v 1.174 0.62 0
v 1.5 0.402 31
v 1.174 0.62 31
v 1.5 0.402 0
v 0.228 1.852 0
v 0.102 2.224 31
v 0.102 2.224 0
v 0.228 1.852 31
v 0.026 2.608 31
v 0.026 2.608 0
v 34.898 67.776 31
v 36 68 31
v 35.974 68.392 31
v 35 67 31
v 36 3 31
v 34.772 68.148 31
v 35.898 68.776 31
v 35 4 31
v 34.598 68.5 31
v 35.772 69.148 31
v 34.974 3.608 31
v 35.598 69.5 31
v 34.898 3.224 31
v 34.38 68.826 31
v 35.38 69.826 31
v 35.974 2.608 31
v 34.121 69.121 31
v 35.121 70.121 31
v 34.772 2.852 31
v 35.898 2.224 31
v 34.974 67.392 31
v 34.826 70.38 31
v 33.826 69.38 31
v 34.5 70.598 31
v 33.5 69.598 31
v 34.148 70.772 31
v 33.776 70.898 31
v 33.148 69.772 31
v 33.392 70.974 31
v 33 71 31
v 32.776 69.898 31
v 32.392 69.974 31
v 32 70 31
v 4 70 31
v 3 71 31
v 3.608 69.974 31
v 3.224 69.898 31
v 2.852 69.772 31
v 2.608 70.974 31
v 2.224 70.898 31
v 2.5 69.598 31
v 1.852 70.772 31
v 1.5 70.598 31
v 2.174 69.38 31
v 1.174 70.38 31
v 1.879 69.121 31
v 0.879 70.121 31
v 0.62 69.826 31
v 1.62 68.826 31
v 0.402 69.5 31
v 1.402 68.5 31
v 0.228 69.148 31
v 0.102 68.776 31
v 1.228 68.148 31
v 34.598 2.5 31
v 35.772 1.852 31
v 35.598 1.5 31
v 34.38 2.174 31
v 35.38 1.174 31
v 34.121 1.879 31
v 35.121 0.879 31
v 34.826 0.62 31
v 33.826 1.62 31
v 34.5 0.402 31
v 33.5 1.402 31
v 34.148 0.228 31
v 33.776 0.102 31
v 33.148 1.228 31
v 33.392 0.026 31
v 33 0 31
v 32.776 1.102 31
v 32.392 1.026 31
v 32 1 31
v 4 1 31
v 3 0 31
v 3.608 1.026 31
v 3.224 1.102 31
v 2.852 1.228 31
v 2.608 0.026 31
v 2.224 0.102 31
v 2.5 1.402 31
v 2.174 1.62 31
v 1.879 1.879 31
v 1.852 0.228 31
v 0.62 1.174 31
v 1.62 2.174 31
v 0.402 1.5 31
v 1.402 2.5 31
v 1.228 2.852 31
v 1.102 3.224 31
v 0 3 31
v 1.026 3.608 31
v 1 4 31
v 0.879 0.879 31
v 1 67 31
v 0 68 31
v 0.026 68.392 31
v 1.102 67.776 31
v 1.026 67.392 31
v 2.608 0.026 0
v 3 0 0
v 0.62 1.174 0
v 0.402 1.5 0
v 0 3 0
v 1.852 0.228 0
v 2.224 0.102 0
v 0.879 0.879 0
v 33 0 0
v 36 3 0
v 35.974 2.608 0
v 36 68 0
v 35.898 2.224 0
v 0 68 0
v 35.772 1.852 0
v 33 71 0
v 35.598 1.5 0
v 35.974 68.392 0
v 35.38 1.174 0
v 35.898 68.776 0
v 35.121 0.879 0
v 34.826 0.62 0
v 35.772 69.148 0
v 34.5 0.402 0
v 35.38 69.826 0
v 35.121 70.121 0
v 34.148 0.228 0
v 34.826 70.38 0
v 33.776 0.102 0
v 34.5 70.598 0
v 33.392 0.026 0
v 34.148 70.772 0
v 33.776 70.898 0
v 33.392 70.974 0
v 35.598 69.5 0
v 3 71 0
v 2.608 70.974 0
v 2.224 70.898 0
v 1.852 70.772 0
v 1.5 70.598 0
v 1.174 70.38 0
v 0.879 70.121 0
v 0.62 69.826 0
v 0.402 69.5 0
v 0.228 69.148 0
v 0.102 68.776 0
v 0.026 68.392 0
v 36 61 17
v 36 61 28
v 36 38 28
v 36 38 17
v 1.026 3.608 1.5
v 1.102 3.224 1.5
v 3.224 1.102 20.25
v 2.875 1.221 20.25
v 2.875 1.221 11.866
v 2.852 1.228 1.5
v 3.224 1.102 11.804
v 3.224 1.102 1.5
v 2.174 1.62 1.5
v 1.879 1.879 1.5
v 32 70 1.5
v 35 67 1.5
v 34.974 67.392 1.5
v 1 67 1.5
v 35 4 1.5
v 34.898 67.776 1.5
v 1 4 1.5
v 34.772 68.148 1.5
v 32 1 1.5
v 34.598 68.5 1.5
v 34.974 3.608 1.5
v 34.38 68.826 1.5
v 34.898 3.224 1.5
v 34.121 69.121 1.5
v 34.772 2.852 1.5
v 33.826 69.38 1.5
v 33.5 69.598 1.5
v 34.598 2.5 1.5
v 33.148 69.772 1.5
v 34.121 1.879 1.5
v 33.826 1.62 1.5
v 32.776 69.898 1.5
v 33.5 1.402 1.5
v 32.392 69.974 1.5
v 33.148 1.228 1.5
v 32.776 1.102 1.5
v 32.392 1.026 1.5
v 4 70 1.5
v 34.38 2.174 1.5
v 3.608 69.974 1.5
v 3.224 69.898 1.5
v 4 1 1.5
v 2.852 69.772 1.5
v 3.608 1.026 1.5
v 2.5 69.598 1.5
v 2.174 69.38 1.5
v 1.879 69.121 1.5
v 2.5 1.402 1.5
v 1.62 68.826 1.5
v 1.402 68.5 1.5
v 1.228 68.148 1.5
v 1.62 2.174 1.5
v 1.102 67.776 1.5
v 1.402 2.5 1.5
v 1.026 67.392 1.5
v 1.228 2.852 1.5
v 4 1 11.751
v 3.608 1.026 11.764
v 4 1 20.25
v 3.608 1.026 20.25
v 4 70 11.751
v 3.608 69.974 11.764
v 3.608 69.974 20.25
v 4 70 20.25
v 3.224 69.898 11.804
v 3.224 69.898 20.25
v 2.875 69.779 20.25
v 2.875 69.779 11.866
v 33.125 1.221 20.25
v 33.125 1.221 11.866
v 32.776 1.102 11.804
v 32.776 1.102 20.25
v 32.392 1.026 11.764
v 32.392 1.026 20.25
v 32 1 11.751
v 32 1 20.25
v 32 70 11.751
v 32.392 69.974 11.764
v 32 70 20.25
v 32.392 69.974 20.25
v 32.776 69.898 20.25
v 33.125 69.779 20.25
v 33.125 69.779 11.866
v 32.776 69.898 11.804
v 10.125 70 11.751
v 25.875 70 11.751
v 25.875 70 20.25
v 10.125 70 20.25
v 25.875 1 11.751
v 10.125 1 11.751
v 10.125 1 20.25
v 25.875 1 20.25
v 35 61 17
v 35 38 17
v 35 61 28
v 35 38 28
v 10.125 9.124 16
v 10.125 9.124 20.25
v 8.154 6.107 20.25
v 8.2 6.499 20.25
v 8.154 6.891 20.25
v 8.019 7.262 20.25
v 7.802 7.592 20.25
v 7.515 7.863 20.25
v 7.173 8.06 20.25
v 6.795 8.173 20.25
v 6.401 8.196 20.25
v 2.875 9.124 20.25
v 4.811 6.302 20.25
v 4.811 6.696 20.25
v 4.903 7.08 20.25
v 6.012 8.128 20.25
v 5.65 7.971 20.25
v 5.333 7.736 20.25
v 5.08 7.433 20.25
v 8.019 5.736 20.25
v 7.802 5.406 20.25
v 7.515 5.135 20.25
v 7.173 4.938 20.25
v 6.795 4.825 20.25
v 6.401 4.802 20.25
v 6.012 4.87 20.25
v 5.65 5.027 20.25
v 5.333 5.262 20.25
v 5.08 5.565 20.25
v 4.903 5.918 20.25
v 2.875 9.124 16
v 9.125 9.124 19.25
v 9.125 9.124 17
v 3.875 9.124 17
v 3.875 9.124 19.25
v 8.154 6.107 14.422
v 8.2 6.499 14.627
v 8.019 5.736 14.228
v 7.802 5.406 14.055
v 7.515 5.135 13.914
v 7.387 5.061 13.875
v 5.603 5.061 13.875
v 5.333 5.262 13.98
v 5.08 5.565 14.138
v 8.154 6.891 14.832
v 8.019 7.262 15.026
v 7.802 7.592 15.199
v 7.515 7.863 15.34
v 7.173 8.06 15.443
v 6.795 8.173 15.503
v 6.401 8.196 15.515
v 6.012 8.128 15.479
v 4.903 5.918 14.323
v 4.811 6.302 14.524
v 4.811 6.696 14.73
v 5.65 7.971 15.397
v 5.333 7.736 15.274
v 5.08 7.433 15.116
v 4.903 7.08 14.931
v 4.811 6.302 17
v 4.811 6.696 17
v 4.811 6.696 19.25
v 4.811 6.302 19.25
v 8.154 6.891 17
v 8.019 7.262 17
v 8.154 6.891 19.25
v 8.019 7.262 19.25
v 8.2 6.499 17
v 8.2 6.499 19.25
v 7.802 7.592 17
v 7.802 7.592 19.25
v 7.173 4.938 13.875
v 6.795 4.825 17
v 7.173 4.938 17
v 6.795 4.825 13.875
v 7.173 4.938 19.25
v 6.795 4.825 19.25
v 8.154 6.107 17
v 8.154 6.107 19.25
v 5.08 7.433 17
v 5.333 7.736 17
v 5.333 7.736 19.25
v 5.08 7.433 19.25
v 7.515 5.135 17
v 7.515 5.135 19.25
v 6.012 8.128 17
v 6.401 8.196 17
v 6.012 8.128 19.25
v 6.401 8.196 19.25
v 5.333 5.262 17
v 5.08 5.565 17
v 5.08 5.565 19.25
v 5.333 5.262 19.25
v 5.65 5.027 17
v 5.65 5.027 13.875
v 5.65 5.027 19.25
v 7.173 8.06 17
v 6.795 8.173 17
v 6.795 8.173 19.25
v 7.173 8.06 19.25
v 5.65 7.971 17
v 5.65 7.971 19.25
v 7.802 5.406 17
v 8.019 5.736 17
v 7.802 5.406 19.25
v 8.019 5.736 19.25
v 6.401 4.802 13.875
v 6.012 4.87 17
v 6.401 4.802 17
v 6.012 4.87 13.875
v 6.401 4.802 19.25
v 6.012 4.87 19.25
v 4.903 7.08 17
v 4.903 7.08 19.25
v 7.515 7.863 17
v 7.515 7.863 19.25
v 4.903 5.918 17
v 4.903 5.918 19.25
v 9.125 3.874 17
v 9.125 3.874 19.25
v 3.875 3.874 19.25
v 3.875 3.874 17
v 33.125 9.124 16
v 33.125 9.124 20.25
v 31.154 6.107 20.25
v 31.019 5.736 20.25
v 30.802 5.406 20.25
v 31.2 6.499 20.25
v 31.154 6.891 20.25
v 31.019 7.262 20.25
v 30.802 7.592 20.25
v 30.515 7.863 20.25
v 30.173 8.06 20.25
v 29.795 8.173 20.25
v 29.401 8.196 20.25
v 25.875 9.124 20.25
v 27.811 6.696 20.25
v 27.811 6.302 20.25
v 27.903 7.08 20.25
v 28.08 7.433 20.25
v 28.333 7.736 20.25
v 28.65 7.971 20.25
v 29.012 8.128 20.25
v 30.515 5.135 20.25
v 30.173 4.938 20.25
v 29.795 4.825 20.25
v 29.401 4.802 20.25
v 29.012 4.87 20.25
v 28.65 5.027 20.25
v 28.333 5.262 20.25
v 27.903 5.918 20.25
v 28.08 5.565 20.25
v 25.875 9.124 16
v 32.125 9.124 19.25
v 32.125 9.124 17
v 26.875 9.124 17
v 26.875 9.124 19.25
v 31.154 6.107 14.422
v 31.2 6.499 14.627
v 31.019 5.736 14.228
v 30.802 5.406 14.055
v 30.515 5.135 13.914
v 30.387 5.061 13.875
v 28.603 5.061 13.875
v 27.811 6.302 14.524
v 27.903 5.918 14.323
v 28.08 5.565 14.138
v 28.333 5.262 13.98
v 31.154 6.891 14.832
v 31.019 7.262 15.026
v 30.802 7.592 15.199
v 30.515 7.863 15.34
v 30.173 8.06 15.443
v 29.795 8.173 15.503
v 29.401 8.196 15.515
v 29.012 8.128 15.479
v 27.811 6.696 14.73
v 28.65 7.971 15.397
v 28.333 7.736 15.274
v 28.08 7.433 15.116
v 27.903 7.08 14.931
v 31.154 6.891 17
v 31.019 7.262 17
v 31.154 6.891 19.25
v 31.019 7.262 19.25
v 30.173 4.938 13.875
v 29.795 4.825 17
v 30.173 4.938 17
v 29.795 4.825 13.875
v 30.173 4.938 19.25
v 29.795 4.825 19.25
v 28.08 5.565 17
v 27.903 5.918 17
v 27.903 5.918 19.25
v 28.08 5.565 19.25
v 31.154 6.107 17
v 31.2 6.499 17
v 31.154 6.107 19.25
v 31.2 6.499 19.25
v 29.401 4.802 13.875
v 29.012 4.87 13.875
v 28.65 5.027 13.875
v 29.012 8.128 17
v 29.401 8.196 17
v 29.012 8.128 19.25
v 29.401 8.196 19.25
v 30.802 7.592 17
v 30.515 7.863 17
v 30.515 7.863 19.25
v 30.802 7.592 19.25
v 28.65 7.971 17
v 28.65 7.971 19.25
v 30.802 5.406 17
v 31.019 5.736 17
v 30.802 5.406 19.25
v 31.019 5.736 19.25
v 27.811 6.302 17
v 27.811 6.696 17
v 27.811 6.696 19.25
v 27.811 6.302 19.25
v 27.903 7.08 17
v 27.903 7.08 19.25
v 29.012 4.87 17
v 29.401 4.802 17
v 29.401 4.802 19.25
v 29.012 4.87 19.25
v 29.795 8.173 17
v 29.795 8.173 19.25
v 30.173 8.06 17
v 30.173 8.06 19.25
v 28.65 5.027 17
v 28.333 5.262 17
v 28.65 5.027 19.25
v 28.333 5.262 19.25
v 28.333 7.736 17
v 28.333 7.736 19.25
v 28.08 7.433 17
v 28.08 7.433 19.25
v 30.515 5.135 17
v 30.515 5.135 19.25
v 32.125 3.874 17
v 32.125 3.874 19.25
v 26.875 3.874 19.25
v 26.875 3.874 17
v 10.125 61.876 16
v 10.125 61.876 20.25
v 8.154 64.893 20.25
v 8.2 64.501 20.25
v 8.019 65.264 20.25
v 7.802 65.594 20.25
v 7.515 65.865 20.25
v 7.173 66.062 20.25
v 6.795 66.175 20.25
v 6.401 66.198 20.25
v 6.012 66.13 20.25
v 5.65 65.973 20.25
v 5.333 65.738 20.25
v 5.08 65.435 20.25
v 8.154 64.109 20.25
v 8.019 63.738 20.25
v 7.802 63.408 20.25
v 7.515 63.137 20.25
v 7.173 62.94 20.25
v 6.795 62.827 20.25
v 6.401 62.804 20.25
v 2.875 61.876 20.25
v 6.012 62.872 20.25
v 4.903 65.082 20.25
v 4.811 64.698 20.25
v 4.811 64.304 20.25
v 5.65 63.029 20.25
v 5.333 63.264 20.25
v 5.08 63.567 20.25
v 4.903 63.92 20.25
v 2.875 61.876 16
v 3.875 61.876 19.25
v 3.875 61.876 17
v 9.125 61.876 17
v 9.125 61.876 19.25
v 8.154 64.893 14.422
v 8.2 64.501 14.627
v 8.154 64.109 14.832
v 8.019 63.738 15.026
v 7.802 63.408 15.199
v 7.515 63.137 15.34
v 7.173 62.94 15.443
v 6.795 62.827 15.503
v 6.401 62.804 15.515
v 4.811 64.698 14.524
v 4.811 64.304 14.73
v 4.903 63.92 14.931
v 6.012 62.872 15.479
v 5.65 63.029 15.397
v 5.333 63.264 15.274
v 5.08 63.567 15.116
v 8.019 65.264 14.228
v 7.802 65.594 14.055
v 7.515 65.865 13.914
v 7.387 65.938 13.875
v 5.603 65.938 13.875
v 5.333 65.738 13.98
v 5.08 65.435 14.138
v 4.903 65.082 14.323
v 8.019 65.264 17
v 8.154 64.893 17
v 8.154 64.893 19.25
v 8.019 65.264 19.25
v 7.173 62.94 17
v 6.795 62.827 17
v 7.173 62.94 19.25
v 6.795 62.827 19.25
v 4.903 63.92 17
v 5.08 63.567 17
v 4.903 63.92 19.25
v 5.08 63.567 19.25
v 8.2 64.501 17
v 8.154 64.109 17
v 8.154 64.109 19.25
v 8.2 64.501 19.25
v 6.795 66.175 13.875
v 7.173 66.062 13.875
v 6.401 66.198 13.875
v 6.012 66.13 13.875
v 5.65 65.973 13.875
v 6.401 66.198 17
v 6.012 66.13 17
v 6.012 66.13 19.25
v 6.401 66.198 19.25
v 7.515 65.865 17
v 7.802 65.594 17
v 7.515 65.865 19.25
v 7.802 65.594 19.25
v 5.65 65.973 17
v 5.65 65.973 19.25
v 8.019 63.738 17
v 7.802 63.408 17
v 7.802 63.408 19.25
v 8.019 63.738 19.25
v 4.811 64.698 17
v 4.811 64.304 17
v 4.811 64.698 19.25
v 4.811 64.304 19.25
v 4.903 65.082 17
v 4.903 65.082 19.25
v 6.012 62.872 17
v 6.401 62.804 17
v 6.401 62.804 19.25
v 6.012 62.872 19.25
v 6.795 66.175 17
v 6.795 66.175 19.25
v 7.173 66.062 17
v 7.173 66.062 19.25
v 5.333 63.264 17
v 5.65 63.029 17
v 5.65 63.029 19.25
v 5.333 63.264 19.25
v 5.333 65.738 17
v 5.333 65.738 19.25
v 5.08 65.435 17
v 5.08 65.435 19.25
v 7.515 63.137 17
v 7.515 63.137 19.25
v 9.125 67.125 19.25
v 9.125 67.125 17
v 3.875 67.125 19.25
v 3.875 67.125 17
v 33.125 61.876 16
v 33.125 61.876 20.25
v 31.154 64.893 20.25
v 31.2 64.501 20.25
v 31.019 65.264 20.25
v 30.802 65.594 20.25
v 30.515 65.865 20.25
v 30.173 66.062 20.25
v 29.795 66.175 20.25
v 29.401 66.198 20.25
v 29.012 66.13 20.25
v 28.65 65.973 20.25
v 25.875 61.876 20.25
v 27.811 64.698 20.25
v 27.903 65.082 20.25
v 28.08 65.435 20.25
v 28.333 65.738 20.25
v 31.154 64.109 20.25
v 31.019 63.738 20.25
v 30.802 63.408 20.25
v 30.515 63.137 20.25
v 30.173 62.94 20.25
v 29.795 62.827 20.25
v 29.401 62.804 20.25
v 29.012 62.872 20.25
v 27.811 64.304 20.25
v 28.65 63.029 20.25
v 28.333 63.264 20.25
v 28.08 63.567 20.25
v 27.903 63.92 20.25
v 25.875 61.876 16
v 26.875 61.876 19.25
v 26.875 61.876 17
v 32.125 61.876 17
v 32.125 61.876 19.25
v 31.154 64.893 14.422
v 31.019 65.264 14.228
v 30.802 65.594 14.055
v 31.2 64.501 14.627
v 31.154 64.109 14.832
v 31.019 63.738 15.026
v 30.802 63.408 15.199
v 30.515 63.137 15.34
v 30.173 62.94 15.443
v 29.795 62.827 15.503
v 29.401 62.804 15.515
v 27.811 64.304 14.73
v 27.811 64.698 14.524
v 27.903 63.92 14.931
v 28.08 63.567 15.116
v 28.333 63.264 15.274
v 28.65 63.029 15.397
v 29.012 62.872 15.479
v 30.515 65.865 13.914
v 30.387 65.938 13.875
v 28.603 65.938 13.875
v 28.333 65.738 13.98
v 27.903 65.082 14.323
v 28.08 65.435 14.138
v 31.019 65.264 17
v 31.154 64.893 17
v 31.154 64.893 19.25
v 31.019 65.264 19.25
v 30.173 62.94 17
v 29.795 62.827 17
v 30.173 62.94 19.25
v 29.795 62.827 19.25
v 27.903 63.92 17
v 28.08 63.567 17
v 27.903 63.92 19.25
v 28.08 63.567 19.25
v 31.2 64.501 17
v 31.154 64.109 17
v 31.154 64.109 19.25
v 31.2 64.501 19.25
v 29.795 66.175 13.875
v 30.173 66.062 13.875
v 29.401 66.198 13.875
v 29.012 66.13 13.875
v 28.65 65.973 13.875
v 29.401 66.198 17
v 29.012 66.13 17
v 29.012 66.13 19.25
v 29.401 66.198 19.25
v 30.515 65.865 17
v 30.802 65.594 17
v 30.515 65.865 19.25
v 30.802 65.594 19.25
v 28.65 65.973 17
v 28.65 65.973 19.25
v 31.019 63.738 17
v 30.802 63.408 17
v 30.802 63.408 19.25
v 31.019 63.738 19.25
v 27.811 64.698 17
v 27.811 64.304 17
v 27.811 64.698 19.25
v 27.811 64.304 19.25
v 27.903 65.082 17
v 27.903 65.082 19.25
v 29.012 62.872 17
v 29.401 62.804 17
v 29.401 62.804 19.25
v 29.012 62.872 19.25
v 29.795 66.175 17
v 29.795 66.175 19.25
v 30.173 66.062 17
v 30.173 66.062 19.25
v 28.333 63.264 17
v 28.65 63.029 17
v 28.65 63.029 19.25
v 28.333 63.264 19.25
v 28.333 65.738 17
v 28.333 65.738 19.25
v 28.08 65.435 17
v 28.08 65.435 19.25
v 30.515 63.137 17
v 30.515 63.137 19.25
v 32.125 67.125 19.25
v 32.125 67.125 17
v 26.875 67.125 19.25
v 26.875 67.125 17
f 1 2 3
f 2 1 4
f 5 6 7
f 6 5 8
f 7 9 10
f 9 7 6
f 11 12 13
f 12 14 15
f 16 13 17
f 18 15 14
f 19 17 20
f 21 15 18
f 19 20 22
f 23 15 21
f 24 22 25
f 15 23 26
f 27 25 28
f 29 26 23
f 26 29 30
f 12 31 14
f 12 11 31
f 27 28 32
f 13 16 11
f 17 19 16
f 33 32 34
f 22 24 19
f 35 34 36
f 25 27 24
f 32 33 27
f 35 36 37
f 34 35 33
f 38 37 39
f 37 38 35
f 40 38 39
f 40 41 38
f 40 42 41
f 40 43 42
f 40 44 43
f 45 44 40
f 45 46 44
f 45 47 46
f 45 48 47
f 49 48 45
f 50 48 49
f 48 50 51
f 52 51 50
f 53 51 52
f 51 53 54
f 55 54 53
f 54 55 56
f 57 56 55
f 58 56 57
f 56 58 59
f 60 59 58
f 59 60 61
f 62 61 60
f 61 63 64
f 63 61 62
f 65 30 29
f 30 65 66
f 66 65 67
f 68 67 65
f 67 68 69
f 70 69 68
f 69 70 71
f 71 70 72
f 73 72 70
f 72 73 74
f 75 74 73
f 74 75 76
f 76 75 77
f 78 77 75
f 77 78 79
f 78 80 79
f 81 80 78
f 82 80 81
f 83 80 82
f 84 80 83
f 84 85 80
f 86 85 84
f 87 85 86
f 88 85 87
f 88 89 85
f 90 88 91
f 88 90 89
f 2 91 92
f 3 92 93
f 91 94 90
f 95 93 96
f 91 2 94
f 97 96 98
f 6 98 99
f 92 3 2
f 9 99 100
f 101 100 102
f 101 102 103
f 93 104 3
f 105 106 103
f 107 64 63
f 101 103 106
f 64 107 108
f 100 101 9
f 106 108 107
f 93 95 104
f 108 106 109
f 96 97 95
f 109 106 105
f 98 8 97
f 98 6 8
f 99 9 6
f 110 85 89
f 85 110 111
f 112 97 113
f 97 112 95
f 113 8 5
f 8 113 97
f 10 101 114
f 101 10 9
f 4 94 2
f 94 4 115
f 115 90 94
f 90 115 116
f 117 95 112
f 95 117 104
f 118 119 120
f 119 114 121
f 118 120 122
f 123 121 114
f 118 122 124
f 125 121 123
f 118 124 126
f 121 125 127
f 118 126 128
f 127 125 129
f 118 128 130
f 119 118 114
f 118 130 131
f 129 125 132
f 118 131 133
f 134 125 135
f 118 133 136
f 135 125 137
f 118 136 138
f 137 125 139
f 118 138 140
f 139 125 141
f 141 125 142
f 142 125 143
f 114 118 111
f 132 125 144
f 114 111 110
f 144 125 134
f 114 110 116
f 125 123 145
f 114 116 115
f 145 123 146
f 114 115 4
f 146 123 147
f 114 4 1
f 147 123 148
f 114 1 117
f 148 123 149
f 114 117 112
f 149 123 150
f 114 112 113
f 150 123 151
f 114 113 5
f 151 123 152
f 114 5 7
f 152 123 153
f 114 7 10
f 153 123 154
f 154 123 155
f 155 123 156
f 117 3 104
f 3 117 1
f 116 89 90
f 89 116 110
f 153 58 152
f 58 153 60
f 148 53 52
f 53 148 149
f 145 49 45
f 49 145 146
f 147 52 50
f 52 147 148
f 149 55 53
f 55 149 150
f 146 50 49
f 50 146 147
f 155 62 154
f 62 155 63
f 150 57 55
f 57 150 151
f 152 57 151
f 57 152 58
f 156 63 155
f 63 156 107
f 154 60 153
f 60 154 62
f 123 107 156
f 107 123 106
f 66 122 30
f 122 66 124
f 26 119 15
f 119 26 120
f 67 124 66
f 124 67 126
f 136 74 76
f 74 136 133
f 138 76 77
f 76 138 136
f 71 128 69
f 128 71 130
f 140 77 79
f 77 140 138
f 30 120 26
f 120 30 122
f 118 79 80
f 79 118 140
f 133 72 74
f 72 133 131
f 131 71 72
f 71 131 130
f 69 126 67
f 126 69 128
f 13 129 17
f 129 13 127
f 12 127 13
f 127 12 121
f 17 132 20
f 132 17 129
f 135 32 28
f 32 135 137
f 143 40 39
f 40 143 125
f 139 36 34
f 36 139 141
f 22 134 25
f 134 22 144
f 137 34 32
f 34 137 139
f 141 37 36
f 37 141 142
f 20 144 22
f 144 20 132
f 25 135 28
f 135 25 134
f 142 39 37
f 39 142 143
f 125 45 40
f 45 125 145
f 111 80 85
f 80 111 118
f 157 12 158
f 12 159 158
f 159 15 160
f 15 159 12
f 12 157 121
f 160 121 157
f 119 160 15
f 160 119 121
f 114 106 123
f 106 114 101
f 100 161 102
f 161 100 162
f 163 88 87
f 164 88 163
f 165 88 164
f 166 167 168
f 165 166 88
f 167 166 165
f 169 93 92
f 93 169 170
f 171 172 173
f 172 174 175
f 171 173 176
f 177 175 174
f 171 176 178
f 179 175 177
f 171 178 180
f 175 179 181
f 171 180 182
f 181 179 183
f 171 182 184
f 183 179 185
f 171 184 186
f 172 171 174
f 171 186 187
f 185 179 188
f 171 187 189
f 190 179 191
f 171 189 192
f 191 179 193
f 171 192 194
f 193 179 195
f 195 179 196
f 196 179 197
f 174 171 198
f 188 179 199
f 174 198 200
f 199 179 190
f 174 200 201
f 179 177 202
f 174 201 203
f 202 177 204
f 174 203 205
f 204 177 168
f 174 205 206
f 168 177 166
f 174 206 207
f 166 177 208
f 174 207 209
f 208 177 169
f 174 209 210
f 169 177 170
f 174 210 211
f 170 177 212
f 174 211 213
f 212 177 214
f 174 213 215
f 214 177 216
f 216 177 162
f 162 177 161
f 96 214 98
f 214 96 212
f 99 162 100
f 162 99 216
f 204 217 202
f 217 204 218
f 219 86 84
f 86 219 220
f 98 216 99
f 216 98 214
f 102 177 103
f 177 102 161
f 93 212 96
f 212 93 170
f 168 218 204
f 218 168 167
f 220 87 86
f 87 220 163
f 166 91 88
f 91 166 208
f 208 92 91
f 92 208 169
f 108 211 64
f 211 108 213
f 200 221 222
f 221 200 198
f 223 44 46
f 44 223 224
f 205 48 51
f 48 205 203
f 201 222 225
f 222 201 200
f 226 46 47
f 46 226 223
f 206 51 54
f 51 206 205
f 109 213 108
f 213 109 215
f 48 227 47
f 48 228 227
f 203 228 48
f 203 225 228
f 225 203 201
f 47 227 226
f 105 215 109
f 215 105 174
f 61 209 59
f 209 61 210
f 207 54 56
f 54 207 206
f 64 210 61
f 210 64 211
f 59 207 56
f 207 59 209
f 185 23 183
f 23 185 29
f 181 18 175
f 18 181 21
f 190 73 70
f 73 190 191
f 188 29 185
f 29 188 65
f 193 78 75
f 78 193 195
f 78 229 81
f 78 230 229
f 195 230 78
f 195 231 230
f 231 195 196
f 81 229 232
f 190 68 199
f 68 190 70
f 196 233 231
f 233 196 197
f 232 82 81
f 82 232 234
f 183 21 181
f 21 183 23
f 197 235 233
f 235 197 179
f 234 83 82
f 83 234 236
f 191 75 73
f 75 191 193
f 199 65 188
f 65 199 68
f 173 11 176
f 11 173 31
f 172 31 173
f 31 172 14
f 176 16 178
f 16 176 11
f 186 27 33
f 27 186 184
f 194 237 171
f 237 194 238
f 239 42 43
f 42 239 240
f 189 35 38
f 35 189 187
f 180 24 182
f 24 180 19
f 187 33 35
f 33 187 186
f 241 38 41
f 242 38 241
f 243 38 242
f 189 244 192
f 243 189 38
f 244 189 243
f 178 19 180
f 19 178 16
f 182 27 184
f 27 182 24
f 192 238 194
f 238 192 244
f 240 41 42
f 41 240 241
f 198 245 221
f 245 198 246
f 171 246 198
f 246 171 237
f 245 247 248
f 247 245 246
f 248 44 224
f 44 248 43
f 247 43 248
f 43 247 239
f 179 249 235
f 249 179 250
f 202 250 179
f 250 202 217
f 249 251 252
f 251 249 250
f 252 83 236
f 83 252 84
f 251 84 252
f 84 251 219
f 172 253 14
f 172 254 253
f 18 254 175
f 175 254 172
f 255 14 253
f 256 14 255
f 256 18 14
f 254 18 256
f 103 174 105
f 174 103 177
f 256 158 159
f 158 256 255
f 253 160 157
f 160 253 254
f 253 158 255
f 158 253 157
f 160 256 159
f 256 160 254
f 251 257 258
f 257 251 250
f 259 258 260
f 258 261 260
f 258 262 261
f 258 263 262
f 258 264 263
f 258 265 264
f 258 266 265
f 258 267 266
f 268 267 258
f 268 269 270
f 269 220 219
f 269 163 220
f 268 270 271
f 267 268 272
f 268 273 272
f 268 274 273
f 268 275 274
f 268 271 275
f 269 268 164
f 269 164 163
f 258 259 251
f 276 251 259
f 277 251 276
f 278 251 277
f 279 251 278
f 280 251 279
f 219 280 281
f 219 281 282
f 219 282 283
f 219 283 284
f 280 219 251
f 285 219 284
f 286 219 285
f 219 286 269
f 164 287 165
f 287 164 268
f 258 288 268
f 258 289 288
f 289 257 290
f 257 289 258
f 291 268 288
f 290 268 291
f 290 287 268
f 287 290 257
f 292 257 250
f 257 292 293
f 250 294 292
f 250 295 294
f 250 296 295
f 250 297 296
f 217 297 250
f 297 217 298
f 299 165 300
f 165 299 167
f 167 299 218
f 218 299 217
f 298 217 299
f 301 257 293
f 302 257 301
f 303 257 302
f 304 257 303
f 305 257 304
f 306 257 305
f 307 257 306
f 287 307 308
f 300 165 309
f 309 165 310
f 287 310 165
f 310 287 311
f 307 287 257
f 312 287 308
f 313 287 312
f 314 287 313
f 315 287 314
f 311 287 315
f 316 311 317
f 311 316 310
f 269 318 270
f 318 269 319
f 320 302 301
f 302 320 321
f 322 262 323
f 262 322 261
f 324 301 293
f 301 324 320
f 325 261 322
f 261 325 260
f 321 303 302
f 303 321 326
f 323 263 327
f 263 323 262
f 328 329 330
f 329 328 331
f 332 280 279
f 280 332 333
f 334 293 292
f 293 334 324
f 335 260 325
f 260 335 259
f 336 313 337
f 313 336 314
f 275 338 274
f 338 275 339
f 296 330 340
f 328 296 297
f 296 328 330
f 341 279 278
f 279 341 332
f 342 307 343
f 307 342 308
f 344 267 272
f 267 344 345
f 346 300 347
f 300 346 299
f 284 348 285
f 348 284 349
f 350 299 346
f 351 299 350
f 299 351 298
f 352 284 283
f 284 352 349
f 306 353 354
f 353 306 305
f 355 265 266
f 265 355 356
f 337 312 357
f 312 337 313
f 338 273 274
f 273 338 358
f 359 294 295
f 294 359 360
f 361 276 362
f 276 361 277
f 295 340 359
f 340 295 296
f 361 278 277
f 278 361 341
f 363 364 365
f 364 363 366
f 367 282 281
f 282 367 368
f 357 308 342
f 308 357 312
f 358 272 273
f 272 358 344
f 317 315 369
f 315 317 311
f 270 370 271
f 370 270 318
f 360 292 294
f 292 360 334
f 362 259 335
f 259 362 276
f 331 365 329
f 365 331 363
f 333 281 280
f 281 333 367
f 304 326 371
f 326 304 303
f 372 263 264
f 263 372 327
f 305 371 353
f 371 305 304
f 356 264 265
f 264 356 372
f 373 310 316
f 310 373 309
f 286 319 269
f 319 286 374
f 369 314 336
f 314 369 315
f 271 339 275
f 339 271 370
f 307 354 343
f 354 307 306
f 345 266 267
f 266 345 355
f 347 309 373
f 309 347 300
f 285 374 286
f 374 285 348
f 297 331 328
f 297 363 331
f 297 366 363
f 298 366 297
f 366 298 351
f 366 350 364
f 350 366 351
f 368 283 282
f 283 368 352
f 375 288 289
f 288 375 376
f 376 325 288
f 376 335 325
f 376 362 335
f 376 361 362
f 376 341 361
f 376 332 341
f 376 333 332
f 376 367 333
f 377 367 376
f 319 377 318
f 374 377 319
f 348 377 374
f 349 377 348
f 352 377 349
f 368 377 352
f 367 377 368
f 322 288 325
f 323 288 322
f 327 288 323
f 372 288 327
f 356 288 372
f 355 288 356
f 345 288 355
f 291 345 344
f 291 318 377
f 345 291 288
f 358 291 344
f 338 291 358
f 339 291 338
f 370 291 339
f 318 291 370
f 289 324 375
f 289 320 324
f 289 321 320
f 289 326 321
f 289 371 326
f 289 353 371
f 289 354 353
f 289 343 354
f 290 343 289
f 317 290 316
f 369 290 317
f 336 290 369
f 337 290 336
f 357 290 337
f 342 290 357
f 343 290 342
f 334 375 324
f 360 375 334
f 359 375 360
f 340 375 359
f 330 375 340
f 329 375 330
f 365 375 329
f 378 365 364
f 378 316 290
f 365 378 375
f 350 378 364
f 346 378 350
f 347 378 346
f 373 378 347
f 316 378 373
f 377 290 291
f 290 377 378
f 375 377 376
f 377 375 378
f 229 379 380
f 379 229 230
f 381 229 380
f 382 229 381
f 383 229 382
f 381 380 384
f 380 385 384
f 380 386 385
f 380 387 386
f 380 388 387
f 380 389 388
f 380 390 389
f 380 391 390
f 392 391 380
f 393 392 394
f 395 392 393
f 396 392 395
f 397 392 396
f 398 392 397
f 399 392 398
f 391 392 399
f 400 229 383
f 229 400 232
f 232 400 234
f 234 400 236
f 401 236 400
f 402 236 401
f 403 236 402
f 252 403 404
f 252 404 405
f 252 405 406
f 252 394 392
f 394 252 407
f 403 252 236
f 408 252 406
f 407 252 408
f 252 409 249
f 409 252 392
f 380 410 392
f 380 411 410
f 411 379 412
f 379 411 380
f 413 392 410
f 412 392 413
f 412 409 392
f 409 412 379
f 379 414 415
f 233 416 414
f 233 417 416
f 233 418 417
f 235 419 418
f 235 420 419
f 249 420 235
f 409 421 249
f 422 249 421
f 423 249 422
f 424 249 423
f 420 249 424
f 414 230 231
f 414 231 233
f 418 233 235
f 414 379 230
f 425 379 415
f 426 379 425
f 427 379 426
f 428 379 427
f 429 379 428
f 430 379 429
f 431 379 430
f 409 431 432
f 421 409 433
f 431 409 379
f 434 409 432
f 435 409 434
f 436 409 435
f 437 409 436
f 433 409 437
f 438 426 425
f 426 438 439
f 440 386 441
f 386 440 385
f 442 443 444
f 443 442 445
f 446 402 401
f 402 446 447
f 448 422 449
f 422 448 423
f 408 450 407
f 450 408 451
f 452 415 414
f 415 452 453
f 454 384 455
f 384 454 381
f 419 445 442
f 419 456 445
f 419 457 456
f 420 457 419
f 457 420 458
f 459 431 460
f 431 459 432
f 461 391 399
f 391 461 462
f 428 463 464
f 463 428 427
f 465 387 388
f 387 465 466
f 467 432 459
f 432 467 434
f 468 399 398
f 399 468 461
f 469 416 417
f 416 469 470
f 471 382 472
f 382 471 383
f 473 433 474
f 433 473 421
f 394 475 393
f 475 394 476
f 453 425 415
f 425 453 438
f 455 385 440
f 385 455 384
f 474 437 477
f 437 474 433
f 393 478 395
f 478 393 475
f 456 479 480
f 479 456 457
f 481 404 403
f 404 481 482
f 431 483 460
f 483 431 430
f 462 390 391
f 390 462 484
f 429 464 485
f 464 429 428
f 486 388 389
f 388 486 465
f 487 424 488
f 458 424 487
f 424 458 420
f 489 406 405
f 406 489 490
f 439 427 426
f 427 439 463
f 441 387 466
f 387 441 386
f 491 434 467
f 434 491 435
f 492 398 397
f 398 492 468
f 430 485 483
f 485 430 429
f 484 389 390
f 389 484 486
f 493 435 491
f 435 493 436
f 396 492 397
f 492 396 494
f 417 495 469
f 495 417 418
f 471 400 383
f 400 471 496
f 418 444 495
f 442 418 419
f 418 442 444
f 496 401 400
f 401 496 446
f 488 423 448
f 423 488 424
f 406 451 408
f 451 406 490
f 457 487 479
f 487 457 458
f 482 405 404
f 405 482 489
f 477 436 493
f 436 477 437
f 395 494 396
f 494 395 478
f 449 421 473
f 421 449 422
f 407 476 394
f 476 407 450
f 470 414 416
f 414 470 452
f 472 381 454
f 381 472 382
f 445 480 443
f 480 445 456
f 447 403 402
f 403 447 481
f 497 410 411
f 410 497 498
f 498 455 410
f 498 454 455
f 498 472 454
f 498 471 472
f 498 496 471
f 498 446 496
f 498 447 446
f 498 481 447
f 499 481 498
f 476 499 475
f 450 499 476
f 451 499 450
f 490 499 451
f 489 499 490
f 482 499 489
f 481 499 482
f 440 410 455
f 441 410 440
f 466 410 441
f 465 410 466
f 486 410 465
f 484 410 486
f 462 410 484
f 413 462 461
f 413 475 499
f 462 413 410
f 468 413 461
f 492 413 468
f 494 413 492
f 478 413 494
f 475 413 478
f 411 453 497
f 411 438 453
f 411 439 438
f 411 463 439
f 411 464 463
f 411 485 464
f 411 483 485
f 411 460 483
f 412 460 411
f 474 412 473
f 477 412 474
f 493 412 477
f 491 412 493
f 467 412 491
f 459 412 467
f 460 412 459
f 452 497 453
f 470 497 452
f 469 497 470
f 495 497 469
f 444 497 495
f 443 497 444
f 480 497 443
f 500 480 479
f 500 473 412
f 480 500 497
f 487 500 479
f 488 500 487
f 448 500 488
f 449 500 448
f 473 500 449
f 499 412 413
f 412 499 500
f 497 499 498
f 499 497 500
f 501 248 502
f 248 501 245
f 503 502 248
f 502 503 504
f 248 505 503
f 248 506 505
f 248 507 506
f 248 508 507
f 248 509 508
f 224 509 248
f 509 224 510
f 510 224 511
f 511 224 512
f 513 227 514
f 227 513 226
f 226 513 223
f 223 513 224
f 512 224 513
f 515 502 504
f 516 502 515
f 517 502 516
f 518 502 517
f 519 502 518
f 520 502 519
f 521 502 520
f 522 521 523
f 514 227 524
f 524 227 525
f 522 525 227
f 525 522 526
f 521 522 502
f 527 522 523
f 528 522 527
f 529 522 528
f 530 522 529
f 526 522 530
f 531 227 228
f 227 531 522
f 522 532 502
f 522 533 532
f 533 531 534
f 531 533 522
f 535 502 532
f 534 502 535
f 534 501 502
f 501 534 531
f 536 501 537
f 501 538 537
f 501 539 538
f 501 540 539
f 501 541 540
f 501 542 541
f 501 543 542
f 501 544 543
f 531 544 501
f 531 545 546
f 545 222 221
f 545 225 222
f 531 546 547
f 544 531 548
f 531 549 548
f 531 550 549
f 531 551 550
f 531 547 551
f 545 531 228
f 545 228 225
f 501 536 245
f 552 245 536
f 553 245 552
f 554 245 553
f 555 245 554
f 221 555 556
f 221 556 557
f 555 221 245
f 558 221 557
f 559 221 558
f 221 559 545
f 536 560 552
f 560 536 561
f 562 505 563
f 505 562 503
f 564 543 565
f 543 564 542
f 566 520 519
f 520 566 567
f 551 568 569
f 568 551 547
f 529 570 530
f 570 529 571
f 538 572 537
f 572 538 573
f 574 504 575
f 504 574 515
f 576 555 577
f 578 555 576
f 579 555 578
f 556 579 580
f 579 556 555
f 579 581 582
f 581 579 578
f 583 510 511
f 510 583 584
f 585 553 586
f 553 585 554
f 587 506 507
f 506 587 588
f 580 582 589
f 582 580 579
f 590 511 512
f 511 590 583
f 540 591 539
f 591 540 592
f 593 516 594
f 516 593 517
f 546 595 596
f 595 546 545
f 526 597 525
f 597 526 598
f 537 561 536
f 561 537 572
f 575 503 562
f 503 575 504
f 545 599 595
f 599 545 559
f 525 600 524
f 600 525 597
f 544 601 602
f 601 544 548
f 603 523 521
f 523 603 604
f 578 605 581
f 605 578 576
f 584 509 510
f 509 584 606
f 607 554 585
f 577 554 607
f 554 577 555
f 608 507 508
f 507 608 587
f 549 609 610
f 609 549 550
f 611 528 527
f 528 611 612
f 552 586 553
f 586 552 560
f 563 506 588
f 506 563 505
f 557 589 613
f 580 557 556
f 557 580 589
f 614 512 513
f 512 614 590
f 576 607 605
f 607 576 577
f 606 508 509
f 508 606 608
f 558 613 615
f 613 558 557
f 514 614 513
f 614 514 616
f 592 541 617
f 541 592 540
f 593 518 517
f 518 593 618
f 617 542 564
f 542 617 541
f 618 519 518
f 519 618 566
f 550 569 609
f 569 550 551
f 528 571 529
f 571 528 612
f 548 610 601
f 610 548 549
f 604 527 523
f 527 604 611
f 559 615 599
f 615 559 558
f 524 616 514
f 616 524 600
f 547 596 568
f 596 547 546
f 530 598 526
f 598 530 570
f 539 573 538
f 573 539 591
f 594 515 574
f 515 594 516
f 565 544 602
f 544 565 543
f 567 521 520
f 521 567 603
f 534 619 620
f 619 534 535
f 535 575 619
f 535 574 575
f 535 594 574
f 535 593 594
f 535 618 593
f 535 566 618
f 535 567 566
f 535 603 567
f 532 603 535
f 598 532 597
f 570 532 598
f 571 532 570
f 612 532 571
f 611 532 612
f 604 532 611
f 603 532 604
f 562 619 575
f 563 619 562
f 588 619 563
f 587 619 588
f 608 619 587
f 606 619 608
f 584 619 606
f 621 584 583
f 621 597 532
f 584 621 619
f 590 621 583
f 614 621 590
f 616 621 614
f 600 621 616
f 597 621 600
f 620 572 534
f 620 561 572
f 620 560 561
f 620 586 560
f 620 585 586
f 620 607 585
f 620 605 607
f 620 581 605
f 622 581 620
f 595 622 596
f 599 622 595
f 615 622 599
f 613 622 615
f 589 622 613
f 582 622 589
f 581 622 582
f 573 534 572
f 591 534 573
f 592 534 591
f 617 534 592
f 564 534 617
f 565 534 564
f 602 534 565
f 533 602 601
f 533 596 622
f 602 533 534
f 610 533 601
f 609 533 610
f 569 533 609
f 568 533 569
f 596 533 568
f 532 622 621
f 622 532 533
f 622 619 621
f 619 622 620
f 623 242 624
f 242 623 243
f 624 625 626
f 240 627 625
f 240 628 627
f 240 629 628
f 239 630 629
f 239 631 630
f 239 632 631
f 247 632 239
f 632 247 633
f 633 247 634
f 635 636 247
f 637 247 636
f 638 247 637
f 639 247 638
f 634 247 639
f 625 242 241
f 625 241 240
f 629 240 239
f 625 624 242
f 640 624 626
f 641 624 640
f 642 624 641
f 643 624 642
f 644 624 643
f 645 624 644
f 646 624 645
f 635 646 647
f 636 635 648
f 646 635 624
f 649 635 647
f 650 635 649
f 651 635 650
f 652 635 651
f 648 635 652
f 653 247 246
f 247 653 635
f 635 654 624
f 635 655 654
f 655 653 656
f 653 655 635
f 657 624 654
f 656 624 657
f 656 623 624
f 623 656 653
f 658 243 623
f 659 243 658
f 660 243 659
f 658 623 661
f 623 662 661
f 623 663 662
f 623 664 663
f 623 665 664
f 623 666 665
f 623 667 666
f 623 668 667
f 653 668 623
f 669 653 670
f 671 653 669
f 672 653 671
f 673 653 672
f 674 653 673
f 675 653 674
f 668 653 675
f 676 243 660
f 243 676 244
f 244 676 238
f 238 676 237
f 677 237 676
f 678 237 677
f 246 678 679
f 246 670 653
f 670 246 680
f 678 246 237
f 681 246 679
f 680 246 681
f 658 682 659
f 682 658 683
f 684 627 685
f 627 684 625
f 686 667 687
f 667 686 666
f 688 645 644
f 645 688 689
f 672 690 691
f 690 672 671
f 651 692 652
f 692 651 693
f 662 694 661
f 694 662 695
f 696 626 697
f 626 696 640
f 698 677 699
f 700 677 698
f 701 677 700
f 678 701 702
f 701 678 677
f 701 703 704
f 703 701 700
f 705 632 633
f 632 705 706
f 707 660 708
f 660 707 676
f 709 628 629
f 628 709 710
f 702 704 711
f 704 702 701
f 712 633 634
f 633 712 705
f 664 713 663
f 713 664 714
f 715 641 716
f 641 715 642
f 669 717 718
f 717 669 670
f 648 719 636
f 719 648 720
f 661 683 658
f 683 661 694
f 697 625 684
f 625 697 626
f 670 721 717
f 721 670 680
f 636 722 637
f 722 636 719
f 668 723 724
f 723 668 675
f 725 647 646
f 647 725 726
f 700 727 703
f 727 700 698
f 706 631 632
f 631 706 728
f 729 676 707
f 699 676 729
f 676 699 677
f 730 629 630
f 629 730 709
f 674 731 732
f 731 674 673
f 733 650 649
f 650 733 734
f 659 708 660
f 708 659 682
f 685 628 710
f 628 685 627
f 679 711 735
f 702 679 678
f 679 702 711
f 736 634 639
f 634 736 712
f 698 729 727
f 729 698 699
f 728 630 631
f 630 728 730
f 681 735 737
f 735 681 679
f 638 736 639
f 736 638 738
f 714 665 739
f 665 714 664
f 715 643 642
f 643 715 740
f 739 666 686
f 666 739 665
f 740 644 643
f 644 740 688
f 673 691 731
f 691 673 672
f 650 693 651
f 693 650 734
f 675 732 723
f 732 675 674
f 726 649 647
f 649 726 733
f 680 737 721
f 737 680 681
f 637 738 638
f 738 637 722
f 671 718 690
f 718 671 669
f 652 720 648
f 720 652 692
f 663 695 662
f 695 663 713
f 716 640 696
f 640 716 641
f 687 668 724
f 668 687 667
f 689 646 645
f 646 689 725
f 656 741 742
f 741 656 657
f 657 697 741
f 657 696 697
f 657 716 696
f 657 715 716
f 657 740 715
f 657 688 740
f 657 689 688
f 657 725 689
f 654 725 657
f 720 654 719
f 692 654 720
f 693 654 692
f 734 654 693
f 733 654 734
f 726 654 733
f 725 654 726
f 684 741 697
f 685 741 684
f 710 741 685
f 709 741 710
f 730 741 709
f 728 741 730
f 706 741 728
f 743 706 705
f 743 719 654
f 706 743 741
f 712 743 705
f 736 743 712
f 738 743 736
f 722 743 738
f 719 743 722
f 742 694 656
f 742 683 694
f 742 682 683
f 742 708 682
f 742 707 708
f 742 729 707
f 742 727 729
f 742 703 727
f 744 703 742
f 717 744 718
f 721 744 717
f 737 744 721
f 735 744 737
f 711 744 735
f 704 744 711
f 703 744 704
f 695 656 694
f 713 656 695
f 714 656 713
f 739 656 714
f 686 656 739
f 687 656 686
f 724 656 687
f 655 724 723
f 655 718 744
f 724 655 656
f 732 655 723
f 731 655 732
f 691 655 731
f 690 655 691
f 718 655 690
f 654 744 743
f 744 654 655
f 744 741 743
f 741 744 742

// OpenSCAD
// file: globals.scad
// PI Zero
pizero_width = 30;
pizero_height = 65;
pizero_screw_padding=3.5;
pizero_first_micro_usb_y=35;

// Keyboard
keyboard_circuit_width=27.97;
keyboard_circuit_height=46.01;
keyboard_circuit_thickness=0.95;
keyboard_pressed_button_thickness=1.35;
keyboard_released_button_thickness=1.5;
keyboard_tca8418_thickness=0.85;

// Box
box_circuit_padding=2;
box_inner_width=pizero_width+box_circuit_padding*2;
box_inner_height=pizero_height+box_circuit_padding*2;
box_inner_depth=30;
box_wall_thickness=1;
box_outer_width=box_inner_width+box_wall_thickness*2;
box_outer_height=box_inner_height+box_wall_thickness*2;
box_outer_depth=box_inner_depth+box_wall_thickness;
box_corner_radius=3;
box_nut_tolerance=0.25;
box_nut_width=5+box_nut_tolerance;
box_nut_thickness=2+box_nut_tolerance;

// Lid
lid_width=box_outer_width;
lid_height=box_outer_height;
lid_mask_thickness=0.5;
lid_film_thickness=1.4;
lid_film_glue_frame_width=2;
lid_slot_padding=0.5;
lid_slot_width=keyboard_circuit_width+lid_slot_padding;
lid_slot_height=keyboard_circuit_height+lid_slot_padding;
lid_slot_depth=keyboard_circuit_thickness+
               keyboard_tca8418_thickness+
               lid_mask_thickness+
               lid_film_thickness;
lid_slot_floor_thickness=0.5;
lid_thickness=lid_slot_floor_thickness+lid_slot_depth;
lid_slot_hole_y=26;
lid_slot_hole_width=14;
lid_slot_hole_height=11;
lid_screw_padding=box_circuit_padding+pizero_screw_padding;
lid_screw_tolerance=0.5;
lid_screw_radius=2.4/2+lid_screw_tolerance;
// main file
include <MCAD/boxes.scad>;
include <globals.scad>

$fa=1;
$fs=0.4;

collector_hole_width=23;
collector_hole_height=11;
collector_hole_y=box_wall_thickness+box_circuit_padding+
                pizero_first_micro_usb_y;
collector_hole_z=17;

// Box
difference() {
    // Outer box
    translate([box_outer_width/2,box_outer_height/2,
               box_outer_depth/2])
        roundedBox(size=[box_outer_width,box_outer_height,
                         box_outer_depth],
                   radius=box_corner_radius,
                   sidesonly=true);
    // Inner box
    translate([box_inner_width/2+box_wall_thickness,
               box_inner_height/2+box_wall_thickness,
               box_outer_depth/2+box_wall_thickness])
        roundedBox(size=[box_inner_width,box_inner_height,
                         box_inner_depth],
                   radius=box_corner_radius,
                   sidesonly=true);        
    // Connector hole
    translate([box_wall_thickness+box_inner_width-0.001,
               collector_hole_y, collector_hole_z])
        cube([box_wall_thickness*2,collector_hole_width,
              collector_hole_height]); 
}

nut_case_wall_thickness=1;
nut_case_width=box_nut_width+nut_case_wall_thickness*2;
nut_case_height=lid_screw_padding+
                box_nut_width/2;

echo("box_circuit_padding=",box_circuit_padding);
echo("lid_screw_padding=",lid_screw_padding);
echo("nut_case_height",nut_case_height);
echo("box_nut_width/2=", box_nut_width/2);

nut_case_thickness=box_nut_thickness+
                   nut_case_wall_thickness*2;
nut_case_z=16;

// Lower left nut case
nutCase(box_wall_thickness+lid_screw_padding-
        nut_case_width/2,
        box_wall_thickness-0.001,
        nut_case_z, false);
// Lower right nut case
nutCase(box_outer_width-
        (box_wall_thickness+lid_screw_padding+       
         nut_case_width/2),
        box_wall_thickness-0.001,
        nut_case_z, false);
// Upper left nut case
nutCase(box_wall_thickness+lid_screw_padding-
        nut_case_width/2,
        box_outer_height-(box_wall_thickness+nut_case_height)+0.001,
        nut_case_z, true);
// Upper right nut case
nutCase(box_outer_width-
        (box_wall_thickness+lid_screw_padding+       
         nut_case_width/2),
        box_outer_height-(box_wall_thickness+nut_case_height)+0.001,
        nut_case_z, true);

// FIXME: Rewrite. Can be much shorter. Lamer mistakes.
module nutCase(x,y,z,up=true) {
    if(up) {
        difference() {
            union() {
                // Nut case cube
                translate([x,y,z])
                    cube([nut_case_width,nut_case_height,
                          nut_case_thickness]);
                // Nut case support
                translate([x,y,z])
                rotate([0, 90, 0])
                linear_extrude(height=nut_case_width)
                    polygon([[0,0],
                             [0,nut_case_height],
                             [nut_case_thickness, // height
                              nut_case_height]]);
            }
            // Nut case screw
            translate([x+nut_case_width/2,
                       y+box_nut_width/2,
                       z-nut_case_thickness/2])
               cylinder(r=lid_screw_radius,
                        h=nut_case_thickness*2);             
            // Nut case hole
            translate([x+(nut_case_width-box_nut_width)/2,
                         y-0.001,
                       z+(nut_case_thickness-
                          box_nut_thickness)/2])
                cube([box_nut_width,box_nut_width,
                      box_nut_thickness]);           
        }
    } else {
       difference() {
            union() {
                // Nut case cube
                translate([x,y,z])
                    cube([nut_case_width,nut_case_height,
                          nut_case_thickness]);
                // Nut case support
                translate([x+nut_case_width,
                           y+nut_case_height,
                           z])
                rotate([180, 90, 0])
                linear_extrude(height=nut_case_width)
                    polygon([[0,0],
                             [0,nut_case_height],
                             [nut_case_thickness, // height,
                              nut_case_height]]);
            }
            // Nut case screw
            translate([x+nut_case_width/2,
                       y+nut_case_height-box_nut_width/2,
                       z-nut_case_thickness/2])
                cylinder(r=lid_screw_radius,
                         h=nut_case_thickness*2);
            // Nut case hole
            translate([x+(nut_case_width-box_nut_width)/2,
                       y+(nut_case_height-box_nut_width),
                       z+(nut_case_thickness-
                          box_nut_thickness)/2])
               cube([box_nut_width,box_nut_width,
                     box_nut_thickness]);
        }
    }
}
